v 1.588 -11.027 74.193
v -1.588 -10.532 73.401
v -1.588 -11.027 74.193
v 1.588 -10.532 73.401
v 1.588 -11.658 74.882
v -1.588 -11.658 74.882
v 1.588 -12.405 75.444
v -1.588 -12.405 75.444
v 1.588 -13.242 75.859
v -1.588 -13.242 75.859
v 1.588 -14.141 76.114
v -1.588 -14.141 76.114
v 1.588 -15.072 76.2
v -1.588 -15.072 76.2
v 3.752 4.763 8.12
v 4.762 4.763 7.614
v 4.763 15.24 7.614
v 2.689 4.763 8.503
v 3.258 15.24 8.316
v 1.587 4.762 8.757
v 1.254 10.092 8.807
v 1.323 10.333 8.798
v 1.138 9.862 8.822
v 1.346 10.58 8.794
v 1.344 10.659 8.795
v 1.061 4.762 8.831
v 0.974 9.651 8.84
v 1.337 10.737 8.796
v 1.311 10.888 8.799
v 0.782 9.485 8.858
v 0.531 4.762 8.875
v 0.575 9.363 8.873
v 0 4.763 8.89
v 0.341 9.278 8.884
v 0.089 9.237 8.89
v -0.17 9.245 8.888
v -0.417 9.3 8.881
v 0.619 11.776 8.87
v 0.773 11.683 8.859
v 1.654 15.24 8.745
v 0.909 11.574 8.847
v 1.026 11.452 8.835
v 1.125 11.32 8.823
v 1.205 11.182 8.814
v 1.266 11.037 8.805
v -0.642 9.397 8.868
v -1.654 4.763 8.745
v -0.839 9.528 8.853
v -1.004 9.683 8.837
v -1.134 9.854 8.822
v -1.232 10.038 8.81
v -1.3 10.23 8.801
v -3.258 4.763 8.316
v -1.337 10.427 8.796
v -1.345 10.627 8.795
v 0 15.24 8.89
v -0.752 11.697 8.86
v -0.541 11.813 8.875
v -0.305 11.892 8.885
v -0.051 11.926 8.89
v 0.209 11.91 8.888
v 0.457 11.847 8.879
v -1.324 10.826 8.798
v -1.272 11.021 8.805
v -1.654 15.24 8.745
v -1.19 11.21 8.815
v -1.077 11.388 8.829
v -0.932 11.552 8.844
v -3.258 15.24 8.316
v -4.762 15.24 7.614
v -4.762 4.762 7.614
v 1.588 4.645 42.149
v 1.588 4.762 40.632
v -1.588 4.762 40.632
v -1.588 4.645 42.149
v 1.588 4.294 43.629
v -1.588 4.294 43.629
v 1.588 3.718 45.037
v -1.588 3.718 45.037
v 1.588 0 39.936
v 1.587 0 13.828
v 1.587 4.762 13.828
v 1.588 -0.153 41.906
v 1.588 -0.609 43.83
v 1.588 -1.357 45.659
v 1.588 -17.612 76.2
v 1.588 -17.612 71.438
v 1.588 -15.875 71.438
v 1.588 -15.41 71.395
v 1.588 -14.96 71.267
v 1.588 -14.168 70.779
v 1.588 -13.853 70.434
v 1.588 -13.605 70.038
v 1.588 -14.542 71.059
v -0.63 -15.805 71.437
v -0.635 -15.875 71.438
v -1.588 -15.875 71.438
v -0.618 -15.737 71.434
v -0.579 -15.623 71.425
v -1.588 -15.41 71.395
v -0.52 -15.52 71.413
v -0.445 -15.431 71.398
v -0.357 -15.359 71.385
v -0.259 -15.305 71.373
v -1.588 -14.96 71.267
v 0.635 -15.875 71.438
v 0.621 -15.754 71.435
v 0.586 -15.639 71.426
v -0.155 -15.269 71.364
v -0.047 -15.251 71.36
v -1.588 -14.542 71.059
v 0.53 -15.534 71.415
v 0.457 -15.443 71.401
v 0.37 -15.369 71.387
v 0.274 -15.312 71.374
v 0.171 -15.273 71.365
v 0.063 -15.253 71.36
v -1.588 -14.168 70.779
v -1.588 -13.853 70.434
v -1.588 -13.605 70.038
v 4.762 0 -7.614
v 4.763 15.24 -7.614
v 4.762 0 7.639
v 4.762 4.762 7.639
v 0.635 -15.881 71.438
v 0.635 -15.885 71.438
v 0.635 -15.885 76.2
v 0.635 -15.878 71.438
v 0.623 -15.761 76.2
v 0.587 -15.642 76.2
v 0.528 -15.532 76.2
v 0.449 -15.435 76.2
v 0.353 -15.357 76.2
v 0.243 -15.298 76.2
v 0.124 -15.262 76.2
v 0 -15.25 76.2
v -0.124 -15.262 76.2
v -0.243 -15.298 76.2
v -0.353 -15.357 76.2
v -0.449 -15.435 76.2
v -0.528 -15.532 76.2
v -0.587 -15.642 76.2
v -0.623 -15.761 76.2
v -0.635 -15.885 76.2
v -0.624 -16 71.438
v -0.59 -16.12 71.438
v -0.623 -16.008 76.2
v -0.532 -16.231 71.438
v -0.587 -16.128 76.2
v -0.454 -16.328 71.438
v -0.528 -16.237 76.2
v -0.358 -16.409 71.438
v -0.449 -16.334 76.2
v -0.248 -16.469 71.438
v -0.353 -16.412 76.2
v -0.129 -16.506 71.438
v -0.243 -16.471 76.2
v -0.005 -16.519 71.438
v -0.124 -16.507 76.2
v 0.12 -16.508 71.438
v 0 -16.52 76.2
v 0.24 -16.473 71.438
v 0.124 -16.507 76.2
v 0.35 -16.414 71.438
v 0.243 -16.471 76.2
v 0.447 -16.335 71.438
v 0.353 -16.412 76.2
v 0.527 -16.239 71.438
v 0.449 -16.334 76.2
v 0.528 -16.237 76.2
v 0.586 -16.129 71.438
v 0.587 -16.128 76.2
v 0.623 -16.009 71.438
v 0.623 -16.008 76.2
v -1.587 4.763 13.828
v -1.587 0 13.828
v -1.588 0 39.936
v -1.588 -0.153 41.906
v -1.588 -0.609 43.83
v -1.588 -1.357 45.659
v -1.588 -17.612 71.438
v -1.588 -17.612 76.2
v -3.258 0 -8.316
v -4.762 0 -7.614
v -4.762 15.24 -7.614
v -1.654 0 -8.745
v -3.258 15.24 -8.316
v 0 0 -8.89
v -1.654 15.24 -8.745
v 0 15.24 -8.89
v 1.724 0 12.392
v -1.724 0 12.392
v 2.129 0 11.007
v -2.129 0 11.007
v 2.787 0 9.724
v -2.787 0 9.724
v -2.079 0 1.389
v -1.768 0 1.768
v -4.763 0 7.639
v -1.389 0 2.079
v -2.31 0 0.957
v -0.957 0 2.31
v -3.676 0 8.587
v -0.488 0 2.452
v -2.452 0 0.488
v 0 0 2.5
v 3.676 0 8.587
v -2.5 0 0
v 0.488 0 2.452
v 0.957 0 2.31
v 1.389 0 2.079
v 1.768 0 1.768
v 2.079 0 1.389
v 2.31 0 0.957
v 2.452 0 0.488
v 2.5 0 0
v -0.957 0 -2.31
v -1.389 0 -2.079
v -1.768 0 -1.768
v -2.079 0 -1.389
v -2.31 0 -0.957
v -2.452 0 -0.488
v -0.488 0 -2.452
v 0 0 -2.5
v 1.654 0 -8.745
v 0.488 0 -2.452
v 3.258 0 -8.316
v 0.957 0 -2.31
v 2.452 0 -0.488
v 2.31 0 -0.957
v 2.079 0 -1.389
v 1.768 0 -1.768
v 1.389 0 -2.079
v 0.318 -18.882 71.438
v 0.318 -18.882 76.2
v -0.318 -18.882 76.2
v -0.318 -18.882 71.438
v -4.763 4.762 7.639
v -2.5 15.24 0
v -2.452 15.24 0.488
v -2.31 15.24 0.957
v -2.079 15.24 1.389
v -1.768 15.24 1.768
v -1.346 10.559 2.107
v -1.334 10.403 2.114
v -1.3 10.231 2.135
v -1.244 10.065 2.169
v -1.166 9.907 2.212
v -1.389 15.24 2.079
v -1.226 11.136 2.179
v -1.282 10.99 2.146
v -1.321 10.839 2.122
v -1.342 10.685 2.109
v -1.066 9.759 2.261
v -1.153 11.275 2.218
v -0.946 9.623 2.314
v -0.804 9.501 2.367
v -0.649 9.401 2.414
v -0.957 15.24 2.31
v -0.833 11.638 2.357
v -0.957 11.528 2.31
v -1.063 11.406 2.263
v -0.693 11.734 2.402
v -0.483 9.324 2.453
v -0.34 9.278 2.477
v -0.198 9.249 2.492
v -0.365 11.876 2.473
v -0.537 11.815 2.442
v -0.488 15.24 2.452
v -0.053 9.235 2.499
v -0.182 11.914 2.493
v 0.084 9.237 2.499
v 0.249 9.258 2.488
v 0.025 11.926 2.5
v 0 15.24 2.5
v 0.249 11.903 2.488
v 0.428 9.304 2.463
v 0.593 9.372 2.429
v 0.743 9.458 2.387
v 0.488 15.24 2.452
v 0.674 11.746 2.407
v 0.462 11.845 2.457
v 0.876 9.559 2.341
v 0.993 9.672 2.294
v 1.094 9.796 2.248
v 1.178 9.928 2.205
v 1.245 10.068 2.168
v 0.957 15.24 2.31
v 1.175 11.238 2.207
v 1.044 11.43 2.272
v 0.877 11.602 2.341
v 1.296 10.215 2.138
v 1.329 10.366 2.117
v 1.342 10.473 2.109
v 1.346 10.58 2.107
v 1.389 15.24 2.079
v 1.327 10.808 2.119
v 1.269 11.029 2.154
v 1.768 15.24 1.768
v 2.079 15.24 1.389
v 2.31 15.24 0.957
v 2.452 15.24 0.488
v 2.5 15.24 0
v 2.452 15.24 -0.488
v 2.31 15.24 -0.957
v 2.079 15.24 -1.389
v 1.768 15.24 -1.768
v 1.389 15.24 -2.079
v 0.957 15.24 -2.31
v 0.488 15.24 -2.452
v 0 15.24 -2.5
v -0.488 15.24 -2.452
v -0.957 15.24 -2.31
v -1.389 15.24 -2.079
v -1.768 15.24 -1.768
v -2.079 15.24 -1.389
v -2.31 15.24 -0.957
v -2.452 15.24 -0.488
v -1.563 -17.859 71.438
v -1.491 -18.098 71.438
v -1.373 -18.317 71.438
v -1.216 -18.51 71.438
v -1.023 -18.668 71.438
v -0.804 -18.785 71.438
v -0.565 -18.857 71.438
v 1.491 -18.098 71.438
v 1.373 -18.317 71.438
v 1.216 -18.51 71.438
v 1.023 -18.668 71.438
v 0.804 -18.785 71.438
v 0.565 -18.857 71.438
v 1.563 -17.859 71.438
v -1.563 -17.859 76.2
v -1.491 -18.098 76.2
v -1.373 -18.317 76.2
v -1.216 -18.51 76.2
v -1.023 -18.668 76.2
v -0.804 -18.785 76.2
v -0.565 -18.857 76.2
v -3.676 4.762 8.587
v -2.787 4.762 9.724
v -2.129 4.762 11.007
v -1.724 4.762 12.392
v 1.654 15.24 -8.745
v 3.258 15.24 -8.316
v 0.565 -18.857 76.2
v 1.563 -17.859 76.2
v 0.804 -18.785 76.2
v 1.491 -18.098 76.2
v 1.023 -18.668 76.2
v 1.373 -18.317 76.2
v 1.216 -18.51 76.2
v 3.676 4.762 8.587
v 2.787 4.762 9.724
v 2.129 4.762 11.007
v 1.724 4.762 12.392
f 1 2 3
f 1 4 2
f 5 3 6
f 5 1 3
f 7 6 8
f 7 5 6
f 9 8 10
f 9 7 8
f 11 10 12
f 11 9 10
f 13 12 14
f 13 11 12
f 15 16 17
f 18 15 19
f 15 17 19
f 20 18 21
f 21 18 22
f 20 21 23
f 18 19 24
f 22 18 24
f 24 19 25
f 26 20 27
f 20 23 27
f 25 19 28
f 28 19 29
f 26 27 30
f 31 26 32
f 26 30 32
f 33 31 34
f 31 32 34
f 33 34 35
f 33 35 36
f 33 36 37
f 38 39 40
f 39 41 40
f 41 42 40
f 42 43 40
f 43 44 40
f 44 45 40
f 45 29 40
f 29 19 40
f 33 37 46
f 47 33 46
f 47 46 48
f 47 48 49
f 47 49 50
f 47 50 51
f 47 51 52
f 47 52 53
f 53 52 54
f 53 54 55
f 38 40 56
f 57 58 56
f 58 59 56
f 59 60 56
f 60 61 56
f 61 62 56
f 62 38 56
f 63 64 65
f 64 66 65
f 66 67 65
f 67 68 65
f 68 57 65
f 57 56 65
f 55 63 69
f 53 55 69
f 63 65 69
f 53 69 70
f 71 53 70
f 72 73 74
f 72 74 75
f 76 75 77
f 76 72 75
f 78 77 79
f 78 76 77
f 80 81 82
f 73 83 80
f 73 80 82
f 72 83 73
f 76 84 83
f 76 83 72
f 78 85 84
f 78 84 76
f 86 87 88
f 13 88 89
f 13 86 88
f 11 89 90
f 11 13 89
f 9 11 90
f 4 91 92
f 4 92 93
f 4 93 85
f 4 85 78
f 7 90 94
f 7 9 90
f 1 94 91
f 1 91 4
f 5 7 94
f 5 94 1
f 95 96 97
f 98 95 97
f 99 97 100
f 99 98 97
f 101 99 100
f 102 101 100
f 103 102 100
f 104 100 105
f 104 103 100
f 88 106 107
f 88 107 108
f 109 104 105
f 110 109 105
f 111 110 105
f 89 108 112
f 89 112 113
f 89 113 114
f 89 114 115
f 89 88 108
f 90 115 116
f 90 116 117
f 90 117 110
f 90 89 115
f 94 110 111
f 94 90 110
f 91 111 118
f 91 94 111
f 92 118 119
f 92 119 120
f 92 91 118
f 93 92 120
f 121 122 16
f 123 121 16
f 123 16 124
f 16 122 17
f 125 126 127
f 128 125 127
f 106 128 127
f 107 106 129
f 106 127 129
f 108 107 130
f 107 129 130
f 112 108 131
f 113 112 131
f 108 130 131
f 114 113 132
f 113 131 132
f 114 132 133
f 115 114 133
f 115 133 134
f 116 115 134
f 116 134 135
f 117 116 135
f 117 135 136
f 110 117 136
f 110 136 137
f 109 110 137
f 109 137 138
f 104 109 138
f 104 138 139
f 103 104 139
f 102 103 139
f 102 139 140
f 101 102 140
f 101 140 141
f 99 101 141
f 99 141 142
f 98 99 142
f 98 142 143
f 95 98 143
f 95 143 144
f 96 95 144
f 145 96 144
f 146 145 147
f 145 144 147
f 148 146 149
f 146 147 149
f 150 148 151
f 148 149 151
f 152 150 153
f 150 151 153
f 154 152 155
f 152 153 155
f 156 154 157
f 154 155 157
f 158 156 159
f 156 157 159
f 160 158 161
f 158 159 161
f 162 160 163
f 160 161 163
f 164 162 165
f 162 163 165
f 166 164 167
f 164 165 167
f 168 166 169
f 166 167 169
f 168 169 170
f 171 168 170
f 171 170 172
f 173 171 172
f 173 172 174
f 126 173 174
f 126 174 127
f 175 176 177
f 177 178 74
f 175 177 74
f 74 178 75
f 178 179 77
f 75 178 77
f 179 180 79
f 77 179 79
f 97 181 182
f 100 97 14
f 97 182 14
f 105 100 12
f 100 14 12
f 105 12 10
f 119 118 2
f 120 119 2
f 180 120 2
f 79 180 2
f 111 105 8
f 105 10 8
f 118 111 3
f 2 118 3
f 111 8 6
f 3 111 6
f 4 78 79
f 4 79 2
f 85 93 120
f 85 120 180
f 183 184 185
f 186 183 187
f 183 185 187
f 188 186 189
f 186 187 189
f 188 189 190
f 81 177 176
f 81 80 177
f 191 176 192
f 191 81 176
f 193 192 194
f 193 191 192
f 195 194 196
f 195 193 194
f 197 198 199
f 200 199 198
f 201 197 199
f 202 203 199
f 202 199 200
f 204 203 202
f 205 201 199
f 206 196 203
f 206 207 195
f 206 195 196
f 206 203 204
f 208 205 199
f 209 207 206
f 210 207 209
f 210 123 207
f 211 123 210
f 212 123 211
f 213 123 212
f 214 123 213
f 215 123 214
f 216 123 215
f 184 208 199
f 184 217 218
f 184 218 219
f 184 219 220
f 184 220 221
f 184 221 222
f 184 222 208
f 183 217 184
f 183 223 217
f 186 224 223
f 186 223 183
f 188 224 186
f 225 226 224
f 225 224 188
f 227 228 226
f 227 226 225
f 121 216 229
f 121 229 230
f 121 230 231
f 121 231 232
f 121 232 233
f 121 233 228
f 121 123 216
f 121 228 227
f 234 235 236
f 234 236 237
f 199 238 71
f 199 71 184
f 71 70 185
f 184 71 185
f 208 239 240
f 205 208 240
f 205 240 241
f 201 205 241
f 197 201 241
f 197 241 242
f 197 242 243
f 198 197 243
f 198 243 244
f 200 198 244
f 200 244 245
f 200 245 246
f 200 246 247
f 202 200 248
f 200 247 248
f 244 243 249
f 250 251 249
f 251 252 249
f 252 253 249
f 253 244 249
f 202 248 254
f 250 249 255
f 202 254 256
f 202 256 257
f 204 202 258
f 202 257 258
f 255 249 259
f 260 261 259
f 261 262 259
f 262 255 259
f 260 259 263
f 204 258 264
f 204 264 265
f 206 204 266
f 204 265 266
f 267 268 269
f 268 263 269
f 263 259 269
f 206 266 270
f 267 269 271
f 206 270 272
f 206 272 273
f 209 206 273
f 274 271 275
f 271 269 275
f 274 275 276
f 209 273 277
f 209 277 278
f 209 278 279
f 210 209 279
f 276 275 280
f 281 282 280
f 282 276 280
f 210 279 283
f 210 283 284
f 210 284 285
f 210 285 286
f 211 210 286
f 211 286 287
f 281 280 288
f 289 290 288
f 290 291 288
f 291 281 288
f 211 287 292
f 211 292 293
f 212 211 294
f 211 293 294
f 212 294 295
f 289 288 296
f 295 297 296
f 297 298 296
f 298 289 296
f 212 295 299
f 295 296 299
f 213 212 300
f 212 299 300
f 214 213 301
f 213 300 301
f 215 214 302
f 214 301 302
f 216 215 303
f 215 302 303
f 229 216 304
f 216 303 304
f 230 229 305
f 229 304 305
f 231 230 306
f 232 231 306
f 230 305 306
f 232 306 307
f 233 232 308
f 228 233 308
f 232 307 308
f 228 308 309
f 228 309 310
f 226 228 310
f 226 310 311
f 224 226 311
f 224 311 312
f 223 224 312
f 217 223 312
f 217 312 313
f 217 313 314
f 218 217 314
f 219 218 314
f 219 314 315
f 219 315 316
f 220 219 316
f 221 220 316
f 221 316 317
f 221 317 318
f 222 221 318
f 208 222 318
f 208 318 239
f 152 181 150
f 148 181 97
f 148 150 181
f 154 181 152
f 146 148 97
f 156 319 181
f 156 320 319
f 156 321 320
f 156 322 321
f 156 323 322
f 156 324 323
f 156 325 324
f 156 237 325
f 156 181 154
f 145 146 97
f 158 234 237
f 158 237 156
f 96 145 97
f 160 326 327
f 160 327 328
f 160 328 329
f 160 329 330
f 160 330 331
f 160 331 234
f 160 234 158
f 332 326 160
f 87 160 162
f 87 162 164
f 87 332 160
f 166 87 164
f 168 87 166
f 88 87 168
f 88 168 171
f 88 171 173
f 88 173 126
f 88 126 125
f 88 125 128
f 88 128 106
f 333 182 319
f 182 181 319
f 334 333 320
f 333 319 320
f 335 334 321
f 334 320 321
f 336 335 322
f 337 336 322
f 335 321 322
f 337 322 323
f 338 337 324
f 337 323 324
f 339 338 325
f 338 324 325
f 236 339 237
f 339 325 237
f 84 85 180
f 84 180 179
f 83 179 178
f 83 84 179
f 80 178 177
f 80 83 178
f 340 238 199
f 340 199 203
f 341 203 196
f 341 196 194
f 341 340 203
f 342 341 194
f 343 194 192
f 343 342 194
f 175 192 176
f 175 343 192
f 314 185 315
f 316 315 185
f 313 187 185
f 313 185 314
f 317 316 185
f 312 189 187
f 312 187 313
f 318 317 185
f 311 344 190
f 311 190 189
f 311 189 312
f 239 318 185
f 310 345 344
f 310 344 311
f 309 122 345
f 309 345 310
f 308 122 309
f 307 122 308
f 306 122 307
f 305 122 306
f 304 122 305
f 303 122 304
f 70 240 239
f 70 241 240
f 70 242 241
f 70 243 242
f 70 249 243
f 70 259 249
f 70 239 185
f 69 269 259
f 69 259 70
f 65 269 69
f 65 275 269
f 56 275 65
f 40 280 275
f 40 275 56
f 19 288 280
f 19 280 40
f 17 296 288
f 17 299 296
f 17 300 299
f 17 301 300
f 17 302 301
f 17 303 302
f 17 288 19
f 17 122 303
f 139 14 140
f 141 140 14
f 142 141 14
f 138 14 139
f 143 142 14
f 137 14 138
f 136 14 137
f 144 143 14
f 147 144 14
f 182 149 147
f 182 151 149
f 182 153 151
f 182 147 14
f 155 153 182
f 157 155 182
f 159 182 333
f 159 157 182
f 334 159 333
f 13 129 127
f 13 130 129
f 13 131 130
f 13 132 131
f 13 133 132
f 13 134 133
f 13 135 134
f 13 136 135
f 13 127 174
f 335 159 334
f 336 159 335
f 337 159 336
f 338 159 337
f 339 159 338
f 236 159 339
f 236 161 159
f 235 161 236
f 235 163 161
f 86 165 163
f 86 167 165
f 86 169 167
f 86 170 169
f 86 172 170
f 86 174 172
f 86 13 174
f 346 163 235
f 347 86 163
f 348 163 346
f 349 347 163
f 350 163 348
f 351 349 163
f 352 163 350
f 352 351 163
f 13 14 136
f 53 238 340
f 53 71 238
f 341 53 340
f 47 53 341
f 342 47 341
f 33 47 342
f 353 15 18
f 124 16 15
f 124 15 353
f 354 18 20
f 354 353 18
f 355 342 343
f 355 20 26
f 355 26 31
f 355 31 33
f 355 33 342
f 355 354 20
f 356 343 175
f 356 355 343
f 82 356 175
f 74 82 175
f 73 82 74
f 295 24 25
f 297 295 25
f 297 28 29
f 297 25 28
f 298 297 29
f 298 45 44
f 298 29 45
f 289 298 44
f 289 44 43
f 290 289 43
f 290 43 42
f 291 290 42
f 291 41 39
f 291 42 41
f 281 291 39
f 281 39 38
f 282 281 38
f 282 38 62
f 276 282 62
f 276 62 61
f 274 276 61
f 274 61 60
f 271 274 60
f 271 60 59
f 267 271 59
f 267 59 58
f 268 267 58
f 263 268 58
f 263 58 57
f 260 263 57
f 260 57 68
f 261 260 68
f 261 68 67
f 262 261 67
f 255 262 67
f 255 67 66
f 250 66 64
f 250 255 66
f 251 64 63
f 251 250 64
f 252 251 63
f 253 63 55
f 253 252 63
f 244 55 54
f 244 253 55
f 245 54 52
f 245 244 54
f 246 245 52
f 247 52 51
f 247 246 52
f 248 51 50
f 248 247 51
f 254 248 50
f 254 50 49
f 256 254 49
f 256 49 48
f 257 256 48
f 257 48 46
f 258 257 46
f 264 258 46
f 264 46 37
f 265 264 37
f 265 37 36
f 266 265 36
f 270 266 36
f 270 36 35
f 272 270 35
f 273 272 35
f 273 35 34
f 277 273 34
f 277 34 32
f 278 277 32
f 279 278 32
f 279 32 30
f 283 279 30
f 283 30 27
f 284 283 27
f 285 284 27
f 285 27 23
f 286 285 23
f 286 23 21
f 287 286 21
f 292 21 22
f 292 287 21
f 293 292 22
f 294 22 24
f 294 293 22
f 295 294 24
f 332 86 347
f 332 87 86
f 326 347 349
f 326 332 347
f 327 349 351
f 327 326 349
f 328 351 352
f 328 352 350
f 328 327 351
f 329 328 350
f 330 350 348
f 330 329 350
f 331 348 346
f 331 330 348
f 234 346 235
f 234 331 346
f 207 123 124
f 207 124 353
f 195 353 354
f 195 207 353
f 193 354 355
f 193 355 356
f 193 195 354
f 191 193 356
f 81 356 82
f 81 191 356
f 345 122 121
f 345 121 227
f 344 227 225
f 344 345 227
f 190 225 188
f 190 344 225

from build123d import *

# Parameters (mm, degrees)
F2_DEPTH      = 1.5875
F2_DEPTH_BACK = 1.5875
F3_DEPTH      = 9.525
F3_DEPTH_BACK = 9.525
F4_T1_DEPTH   = 62.865
F4_T6_DEPTH   = 62.865
F4_T11_DEPTH  = 62.865
F4_T16_DEPTH  = 62.865
F4_T21_DEPTH  = 62.865
F5_R          = 2.5
F6_DEPTH      = 34.1227081721
F7_R          = 1.3462
F8_DEPTH      = 25.4
F9_R          = 7.62
F10_R         = 0.635
F11_DEPTH     = 25.4
F12_R         = 1.27
F14_DEPTH     = 34.1227081721


# Not quite as in the source:
# - a fillet or chamfer that OpenCascade refuses, or shapes differently, is made with other operations: its cross-section is extruded or revolved along the edge and cut away or added
# - a feature names something its author has since deleted; it is built from what else it names


with BuildPart() as f2:
    # F1 (on Right) → F2 (new body, two sides)
    with BuildSketch(Plane.YZ) as f2_sk:
        with BuildLine():
            Line((-18.8817081721, 76.2), (-18.8817081721, 71.4375))
            Line((-18.8817081721, 71.4375), (-15.875, 71.4375))
            ThreePointArc((-15.875, 71.4375), (-14.541737999, 71.0594464463), (-13.6053613819, 70.0378247534))
            Line((-13.6053613819, 70.0378247534), (-1.35700712, 45.6593854024))
            ThreePointArc((-1.35700712, 45.6593854024), (-0.3438898526, 42.8769409358), (0, 39.9358282931))
            Line((0, 39.9358282931), (0, 8.89))
            Line((0, 8.89), (4.7625, 8.89))
            Line((4.7625, 8.89), (4.7625, 40.6322548497))
            ThreePointArc((4.7625, 40.6322548497), (4.4978433834, 42.8957264678), (3.7181513215, 45.0370875254))
            Line((3.7181513215, 45.0370875254), (-10.5324309359, 73.4006495068))
            ThreePointArc((-10.5324309359, 73.4006495068), (-12.4051841702, 75.4438928927), (-15.0717081721, 76.2))
            Line((-15.0717081721, 76.2), (-18.8817081721, 76.2))
        make_face()
    extrude(amount=F2_DEPTH)
    extrude(f2_sk.sketch, amount=-F2_DEPTH_BACK)

    # F1 (on Right) → F3 (join, two sides)
    with BuildSketch(Plane.YZ) as f3_sk:
        Polygon((4.7625, 8.89), (0, 8.89), (0, -8.89), (15.24, -8.89), (15.24, 8.89), align=None)
    extrude(amount=F3_DEPTH)
    extrude(f3_sk.sketch, amount=-F3_DEPTH_BACK)

    # F4: fillet of radius 9.525 on 4 edges, made by hand

    # F4_s2 → F4_t1 (cut)
    with BuildSketch(Plane.XZ.offset(-39.0525)):
        with BuildLine():
            ThreePointArc((9.525, 0.635), (6.7351920908, -6.1001920908), (0, -8.89))
            Line((0, -8.89), (9.525, -8.89))
            Line((9.525, -8.89), (9.525, 0.635))
        make_face()
        with BuildLine():
            ThreePointArc((-9.525, 0.635), (-6.7351920908, -6.1001920908), (0, -8.89))
            Line((0, -8.89), (-9.525, -8.89))
            Line((-9.525, -8.89), (-9.525, 0.635))
        make_face()
    extrude(amount=F4_T1_DEPTH, mode=Mode.SUBTRACT)


with BuildPart() as f4_tool4:
    # F4_s5 → F4_t6 (new body)
    with BuildSketch(Plane.XZ.offset(23.8125)):
        with BuildLine():
            ThreePointArc((0, 8.89), (6.7351920908, 6.1001920908), (9.525, -0.635))
            Line((9.525, -0.635), (9.525, 8.89))
            Line((9.525, 8.89), (0, 8.89))
        make_face()
    extrude(amount=-F4_T6_DEPTH)

    split(bisect_by=Plane.YZ.offset(1.5875), keep=Keep.TOP)


with BuildPart() as f2_1:
    add(f2.part)

    # F4_t3: cut F4_tool4
    add(f4_tool4.part, mode=Mode.SUBTRACT)


with BuildPart() as f4_tool9:
    # F4_s10 → F4_t11 (new body)
    with BuildSketch(Plane.XZ.offset(23.8125)):
        with BuildLine():
            ThreePointArc((0, 8.89), (6.7351920908, 6.1001920908), (9.525, -0.635))
            Line((9.525, -0.635), (9.525, 8.89))
            Line((9.525, 8.89), (0, 8.89))
        make_face()
    extrude(amount=-F4_T11_DEPTH)

    split(bisect_by=Plane.XZ.offset(-4.7625), keep=Keep.BOTTOM)


with BuildPart() as f2_2:
    add(f2_1.part)

    # F4_t8: cut F4_tool9
    add(f4_tool9.part, mode=Mode.SUBTRACT)


with BuildPart() as f4_tool14:
    # F4_s15 → F4_t16 (new body)
    with BuildSketch(Plane.XZ.offset(-39.0525)):
        with BuildLine():
            ThreePointArc((0, 8.89), (-6.7351920908, 6.1001920908), (-9.525, -0.635))
            Line((-9.525, -0.635), (-9.525, 8.89))
            Line((-9.525, 8.89), (0, 8.89))
        make_face()
    extrude(amount=F4_T16_DEPTH)

    split(bisect_by=Plane.XZ.offset(-4.7625), keep=Keep.BOTTOM)


with BuildPart() as f2_3:
    add(f2_2.part)

    # F4_t13: cut F4_tool14
    add(f4_tool14.part, mode=Mode.SUBTRACT)


with BuildPart() as f4_tool19:
    # F4_s20 → F4_t21 (new body)
    with BuildSketch(Plane.XZ.offset(-39.0525)):
        with BuildLine():
            ThreePointArc((0, 8.89), (-6.7351920908, 6.1001920908), (-9.525, -0.635))
            Line((-9.525, -0.635), (-9.525, 8.89))
            Line((-9.525, 8.89), (0, 8.89))
        make_face()
    extrude(amount=F4_T21_DEPTH)

    split(bisect_by=Plane.YZ.offset(-1.5875), keep=Keep.BOTTOM)


with BuildPart() as f2_4:
    add(f2_3.part)

    # F4_t18: cut F4_tool19
    add(f4_tool19.part, mode=Mode.SUBTRACT)

    # F5 (on face) → F6 (cut, through all)
    with BuildSketch(Plane(origin=(0, 15.24, 0), x_dir=(-1, 0, 0), z_dir=(0, 1, 0))):
        Circle(F5_R)
    extrude(amount=-F6_DEPTH, mode=Mode.SUBTRACT)

    # F7 (on Top) → F8 (cut)
    with BuildSketch(Plane.XY):
        with Locations((0, 10.5804353952)):
            Circle(F7_R)
        with Locations((0, -26.9685275853)):
            Circle(F7_R)
    extrude(amount=F8_DEPTH, mode=Mode.SUBTRACT)

    # F9
    f9_edges = [f2_4.edges().sort_by_distance(p)[0] for p in [
        (-9.50381, 7.62, 0),
        (-1.5875, 2.38125, 8.756777),
        (1.5875, 2.38125, 8.756777),
    ]]
    fillet(f9_edges, radius=F9_R)

    # F10 (on face) → F11 (cut)
    with BuildSketch(Plane.XY.offset(76.2)):
        with Locations((0, -15.8845081721)):
            Circle(F10_R)
    extrude(amount=-F11_DEPTH, mode=Mode.SUBTRACT)

    # F12
    f12_edges = [f2_4.edges().sort_by_distance(p)[0] for p in [
        (1.5875, -18.881708, 73.81875),
        (-1.5875, -18.881708, 73.81875),
    ]]
    fillet(f12_edges, radius=F12_R)

    # F13 (on face) → F14 (cut, through all)
    with BuildSketch(Plane(origin=(0, 15.24, 0), x_dir=(-1, 0, 0), z_dir=(0, 1, 0))):
        Polygon((-4.7625, -11.6415646072), (-4.7625, 10.8039603039), (-9.6872693895, 10.8039603039), (-9.6872693895, -15.5402623288), (11.7396748797, -15.5402623288), (11.7396748797, 10.8039603039), (4.7625, 10.8039603039), (4.7625, -11.6415646072), align=None)
    extrude(amount=-F14_DEPTH, mode=Mode.SUBTRACT)


solid = f2_4.part
